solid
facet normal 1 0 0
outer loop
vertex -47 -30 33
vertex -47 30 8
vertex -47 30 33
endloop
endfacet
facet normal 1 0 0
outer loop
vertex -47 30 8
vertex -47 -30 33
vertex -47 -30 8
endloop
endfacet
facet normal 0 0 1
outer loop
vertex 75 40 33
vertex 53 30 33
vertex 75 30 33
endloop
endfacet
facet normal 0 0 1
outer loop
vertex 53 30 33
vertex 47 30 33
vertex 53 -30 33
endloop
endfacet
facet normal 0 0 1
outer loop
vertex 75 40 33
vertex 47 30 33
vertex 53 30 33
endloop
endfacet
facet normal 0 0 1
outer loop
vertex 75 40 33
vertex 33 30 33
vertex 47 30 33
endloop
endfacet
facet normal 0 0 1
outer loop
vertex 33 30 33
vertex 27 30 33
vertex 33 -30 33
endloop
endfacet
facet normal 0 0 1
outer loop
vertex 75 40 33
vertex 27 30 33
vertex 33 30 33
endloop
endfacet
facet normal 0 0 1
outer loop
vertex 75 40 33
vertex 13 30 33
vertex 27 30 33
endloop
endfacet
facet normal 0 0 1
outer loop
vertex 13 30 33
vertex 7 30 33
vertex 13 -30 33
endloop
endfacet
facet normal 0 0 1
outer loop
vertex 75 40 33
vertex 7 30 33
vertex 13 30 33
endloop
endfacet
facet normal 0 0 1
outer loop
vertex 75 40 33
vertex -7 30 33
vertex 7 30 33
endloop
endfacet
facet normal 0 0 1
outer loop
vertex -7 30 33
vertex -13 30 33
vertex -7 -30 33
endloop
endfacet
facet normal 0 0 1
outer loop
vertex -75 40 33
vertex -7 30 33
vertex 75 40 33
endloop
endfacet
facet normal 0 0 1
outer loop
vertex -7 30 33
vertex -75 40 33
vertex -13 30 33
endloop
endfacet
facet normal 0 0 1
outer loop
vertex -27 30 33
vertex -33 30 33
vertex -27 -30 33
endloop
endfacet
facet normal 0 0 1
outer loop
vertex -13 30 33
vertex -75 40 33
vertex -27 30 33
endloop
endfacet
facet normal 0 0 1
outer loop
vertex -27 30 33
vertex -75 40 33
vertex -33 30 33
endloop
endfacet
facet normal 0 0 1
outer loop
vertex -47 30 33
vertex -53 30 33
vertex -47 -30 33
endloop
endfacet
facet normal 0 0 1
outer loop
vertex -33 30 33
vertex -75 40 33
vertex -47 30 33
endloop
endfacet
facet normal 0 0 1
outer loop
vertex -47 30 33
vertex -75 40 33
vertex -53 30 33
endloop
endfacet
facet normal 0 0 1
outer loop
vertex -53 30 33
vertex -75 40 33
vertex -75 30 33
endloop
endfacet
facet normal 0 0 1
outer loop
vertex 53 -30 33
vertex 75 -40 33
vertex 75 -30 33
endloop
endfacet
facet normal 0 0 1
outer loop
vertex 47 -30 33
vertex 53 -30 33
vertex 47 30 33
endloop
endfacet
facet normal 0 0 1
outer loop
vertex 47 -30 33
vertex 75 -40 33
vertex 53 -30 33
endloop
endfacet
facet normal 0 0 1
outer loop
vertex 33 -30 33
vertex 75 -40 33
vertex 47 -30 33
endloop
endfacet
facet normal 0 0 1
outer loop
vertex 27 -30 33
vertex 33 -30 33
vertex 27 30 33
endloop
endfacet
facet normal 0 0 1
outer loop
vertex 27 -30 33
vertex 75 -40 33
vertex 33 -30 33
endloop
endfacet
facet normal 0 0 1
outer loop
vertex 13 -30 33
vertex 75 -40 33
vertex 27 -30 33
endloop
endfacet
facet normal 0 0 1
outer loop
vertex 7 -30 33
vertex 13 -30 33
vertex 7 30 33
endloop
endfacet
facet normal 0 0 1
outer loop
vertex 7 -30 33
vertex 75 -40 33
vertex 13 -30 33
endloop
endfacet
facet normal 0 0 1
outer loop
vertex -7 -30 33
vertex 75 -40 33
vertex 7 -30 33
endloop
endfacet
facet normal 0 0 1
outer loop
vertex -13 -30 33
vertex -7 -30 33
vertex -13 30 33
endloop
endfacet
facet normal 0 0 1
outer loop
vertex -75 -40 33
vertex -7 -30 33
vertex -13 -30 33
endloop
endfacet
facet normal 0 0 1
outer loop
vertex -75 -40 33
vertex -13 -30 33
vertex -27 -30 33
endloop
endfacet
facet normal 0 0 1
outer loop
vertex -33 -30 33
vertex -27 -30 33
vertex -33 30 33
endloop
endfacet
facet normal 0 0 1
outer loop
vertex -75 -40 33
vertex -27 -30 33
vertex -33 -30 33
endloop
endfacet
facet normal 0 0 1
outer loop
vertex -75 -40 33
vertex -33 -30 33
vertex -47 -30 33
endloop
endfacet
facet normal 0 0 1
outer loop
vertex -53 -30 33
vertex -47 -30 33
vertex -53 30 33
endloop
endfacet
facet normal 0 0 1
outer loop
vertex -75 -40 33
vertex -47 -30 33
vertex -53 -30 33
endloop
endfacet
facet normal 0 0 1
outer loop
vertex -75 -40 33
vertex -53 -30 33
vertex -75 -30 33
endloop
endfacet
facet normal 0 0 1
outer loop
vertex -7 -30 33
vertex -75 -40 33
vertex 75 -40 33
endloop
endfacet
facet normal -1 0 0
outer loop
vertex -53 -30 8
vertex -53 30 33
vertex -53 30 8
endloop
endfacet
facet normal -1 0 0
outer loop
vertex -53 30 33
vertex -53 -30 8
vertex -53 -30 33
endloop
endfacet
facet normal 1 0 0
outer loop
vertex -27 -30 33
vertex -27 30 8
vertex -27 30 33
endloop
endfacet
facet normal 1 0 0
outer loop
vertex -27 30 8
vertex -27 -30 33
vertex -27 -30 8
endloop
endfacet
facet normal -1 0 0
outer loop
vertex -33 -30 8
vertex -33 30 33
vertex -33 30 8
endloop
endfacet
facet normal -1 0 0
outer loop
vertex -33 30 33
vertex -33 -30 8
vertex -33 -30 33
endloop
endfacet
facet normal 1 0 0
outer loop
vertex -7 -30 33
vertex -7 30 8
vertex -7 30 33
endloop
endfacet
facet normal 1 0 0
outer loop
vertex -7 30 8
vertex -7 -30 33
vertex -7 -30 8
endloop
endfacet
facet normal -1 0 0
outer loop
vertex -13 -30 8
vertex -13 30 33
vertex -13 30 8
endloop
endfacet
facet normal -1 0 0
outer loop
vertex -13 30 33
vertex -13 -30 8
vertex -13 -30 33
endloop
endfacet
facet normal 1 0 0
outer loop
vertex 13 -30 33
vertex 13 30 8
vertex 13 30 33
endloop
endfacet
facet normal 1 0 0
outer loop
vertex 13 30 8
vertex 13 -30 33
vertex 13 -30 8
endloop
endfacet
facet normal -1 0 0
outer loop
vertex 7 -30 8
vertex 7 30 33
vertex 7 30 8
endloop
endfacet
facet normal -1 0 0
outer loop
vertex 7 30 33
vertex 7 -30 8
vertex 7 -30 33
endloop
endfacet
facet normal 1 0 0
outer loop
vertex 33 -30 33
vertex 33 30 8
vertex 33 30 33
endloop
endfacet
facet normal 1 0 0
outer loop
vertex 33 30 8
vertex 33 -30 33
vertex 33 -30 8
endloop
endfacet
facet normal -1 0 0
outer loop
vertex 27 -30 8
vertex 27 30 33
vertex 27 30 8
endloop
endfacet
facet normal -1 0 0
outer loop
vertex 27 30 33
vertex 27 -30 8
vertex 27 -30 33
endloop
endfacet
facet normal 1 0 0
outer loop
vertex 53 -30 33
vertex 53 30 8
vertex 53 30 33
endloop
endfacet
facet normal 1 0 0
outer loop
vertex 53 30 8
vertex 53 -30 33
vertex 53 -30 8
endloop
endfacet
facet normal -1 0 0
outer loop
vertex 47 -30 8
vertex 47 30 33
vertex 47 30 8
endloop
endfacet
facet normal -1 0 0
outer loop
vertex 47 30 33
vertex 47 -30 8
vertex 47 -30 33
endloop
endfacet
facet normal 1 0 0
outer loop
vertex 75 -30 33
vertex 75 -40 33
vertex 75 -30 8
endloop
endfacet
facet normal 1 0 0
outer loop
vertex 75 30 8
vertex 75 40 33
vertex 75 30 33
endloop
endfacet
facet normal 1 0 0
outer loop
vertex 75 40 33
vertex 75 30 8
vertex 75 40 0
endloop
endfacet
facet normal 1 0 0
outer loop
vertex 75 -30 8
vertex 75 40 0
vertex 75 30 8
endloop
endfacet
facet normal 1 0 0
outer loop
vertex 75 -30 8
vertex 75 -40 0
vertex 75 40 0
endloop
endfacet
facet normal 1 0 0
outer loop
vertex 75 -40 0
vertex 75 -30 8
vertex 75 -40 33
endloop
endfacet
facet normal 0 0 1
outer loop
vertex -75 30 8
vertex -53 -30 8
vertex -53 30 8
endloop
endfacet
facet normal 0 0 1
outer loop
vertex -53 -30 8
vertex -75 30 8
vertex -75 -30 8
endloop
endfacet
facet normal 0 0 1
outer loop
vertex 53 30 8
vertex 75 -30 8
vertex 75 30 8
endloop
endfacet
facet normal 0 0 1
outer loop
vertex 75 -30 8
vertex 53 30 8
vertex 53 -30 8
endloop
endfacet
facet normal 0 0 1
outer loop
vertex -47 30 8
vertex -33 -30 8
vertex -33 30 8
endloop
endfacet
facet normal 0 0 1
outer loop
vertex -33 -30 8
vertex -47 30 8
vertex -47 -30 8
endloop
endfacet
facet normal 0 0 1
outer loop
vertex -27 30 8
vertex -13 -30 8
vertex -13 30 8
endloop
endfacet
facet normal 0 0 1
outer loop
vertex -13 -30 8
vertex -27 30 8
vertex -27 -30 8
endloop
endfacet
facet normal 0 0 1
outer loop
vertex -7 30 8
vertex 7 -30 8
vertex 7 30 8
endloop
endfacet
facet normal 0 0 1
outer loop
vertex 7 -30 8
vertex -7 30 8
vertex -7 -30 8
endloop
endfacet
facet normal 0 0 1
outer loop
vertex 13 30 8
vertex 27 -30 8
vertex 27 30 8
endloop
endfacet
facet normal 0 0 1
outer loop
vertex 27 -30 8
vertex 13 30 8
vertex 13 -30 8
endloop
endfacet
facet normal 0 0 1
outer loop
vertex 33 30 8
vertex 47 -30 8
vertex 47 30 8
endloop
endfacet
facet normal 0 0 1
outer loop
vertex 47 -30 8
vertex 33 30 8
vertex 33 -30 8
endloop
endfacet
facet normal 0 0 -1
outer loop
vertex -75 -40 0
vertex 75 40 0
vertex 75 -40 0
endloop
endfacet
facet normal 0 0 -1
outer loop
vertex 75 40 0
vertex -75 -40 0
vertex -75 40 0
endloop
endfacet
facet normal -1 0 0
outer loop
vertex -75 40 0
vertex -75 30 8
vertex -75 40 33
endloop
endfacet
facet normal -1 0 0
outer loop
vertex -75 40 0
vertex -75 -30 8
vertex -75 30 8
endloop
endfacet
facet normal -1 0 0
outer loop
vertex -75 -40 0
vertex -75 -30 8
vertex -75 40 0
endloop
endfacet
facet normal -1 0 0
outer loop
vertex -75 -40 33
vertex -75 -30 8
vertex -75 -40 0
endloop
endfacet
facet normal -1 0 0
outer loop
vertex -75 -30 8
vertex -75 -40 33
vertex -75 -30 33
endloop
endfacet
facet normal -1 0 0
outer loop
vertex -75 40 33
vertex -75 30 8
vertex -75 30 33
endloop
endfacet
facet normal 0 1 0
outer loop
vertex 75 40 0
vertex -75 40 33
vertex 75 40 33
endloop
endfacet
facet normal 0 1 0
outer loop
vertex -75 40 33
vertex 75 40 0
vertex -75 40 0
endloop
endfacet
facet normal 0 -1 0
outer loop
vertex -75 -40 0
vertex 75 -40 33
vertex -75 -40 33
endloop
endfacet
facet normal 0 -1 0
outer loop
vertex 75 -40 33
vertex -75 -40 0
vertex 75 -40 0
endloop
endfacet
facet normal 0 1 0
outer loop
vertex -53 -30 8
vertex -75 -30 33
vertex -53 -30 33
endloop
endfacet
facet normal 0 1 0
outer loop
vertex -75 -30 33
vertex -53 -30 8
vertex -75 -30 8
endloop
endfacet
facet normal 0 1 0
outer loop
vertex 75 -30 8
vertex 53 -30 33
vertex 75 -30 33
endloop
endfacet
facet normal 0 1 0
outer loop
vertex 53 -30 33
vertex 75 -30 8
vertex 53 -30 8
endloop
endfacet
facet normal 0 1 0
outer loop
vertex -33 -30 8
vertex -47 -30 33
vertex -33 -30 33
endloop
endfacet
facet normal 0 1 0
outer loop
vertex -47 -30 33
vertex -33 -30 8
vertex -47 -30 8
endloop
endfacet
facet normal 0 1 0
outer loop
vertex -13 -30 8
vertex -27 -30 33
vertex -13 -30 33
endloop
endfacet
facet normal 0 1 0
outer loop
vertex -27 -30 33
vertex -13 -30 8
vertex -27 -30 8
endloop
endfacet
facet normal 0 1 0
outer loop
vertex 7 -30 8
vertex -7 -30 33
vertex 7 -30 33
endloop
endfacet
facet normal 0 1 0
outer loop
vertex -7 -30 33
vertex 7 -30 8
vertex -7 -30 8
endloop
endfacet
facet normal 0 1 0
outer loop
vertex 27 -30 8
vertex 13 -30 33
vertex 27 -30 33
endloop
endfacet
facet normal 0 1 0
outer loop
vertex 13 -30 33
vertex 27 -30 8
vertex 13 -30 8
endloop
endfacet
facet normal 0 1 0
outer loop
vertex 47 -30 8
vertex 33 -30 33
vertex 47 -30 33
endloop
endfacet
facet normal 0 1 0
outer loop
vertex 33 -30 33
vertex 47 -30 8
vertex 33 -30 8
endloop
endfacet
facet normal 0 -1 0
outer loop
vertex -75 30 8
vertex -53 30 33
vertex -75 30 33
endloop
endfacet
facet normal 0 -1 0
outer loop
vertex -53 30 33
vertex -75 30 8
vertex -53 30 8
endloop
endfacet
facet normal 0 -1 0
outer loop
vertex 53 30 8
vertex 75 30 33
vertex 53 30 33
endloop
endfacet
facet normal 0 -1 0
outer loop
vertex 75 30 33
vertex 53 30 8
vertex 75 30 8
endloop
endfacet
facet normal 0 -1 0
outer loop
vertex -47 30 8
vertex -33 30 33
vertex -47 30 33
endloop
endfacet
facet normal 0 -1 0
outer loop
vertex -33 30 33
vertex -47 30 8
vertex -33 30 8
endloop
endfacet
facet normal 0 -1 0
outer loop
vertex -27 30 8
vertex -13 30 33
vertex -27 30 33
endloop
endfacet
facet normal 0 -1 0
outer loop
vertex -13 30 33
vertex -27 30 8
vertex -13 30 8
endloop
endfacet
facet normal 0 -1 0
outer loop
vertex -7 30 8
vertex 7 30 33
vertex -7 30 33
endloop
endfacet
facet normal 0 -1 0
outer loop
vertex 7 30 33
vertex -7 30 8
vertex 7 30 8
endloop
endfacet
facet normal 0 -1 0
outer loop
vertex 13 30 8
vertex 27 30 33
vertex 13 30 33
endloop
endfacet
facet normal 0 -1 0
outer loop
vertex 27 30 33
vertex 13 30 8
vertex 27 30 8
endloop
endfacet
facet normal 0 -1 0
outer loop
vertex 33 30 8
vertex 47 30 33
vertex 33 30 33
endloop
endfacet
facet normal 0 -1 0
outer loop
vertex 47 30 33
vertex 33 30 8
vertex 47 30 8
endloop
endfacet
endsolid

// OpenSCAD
$fn = 32;

// ----------------------------------------------------------------------
// Rib frame 150 x 80 x 33
// 6 ribs at 20 mm pitch
// ----------------------------------------------------------------------

// --- parameters (mm) ---
frame = [150, 80, 8];  // base plate size (x, y, z)
rail_w = 10;           // side rail width
ribs = 6;              // number of ribs
rib_t = 6;             // rib thickness
rib_h = 25;            // rib height above the base plate
pitch = 20;            // pitch between rib centres

// --- derived feature positions (mm) ---
span = (ribs - 1) * pitch;          // = 100   distance between the outer ribs
origin_x = -span / 2;               // = -50   X of the first rib
rib_len = frame[1] - 2 * rail_w + 2;  // = 62   rib length, 1 mm into each rail
feature_centers = [
  [origin_x + 0 * pitch, 0],
  [origin_x + 1 * pitch, 0],
  [origin_x + 2 * pitch, 0],
  [origin_x + 3 * pitch, 0],
  [origin_x + 4 * pitch, 0],
  [origin_x + 5 * pitch, 0]
];   // rib centre line, drives the rib loop

// base plate, two side rails, then the ribs read straight off feature_centers
union() {
  translate([-frame[0] / 2, -frame[1] / 2, 0]) cube(frame);
  translate([-frame[0] / 2, -frame[1] / 2, 0]) cube([frame[0], rail_w, frame[2] + rib_h]);
  translate([-frame[0] / 2, frame[1] / 2 - rail_w, 0]) cube([frame[0], rail_w, frame[2] + rib_h]);
  for (centre = feature_centers)
    translate([centre[0] - rib_t / 2, centre[1] - rib_len / 2, frame[2] - 1])
      cube([rib_t, rib_len, rib_h + 1]);
}
